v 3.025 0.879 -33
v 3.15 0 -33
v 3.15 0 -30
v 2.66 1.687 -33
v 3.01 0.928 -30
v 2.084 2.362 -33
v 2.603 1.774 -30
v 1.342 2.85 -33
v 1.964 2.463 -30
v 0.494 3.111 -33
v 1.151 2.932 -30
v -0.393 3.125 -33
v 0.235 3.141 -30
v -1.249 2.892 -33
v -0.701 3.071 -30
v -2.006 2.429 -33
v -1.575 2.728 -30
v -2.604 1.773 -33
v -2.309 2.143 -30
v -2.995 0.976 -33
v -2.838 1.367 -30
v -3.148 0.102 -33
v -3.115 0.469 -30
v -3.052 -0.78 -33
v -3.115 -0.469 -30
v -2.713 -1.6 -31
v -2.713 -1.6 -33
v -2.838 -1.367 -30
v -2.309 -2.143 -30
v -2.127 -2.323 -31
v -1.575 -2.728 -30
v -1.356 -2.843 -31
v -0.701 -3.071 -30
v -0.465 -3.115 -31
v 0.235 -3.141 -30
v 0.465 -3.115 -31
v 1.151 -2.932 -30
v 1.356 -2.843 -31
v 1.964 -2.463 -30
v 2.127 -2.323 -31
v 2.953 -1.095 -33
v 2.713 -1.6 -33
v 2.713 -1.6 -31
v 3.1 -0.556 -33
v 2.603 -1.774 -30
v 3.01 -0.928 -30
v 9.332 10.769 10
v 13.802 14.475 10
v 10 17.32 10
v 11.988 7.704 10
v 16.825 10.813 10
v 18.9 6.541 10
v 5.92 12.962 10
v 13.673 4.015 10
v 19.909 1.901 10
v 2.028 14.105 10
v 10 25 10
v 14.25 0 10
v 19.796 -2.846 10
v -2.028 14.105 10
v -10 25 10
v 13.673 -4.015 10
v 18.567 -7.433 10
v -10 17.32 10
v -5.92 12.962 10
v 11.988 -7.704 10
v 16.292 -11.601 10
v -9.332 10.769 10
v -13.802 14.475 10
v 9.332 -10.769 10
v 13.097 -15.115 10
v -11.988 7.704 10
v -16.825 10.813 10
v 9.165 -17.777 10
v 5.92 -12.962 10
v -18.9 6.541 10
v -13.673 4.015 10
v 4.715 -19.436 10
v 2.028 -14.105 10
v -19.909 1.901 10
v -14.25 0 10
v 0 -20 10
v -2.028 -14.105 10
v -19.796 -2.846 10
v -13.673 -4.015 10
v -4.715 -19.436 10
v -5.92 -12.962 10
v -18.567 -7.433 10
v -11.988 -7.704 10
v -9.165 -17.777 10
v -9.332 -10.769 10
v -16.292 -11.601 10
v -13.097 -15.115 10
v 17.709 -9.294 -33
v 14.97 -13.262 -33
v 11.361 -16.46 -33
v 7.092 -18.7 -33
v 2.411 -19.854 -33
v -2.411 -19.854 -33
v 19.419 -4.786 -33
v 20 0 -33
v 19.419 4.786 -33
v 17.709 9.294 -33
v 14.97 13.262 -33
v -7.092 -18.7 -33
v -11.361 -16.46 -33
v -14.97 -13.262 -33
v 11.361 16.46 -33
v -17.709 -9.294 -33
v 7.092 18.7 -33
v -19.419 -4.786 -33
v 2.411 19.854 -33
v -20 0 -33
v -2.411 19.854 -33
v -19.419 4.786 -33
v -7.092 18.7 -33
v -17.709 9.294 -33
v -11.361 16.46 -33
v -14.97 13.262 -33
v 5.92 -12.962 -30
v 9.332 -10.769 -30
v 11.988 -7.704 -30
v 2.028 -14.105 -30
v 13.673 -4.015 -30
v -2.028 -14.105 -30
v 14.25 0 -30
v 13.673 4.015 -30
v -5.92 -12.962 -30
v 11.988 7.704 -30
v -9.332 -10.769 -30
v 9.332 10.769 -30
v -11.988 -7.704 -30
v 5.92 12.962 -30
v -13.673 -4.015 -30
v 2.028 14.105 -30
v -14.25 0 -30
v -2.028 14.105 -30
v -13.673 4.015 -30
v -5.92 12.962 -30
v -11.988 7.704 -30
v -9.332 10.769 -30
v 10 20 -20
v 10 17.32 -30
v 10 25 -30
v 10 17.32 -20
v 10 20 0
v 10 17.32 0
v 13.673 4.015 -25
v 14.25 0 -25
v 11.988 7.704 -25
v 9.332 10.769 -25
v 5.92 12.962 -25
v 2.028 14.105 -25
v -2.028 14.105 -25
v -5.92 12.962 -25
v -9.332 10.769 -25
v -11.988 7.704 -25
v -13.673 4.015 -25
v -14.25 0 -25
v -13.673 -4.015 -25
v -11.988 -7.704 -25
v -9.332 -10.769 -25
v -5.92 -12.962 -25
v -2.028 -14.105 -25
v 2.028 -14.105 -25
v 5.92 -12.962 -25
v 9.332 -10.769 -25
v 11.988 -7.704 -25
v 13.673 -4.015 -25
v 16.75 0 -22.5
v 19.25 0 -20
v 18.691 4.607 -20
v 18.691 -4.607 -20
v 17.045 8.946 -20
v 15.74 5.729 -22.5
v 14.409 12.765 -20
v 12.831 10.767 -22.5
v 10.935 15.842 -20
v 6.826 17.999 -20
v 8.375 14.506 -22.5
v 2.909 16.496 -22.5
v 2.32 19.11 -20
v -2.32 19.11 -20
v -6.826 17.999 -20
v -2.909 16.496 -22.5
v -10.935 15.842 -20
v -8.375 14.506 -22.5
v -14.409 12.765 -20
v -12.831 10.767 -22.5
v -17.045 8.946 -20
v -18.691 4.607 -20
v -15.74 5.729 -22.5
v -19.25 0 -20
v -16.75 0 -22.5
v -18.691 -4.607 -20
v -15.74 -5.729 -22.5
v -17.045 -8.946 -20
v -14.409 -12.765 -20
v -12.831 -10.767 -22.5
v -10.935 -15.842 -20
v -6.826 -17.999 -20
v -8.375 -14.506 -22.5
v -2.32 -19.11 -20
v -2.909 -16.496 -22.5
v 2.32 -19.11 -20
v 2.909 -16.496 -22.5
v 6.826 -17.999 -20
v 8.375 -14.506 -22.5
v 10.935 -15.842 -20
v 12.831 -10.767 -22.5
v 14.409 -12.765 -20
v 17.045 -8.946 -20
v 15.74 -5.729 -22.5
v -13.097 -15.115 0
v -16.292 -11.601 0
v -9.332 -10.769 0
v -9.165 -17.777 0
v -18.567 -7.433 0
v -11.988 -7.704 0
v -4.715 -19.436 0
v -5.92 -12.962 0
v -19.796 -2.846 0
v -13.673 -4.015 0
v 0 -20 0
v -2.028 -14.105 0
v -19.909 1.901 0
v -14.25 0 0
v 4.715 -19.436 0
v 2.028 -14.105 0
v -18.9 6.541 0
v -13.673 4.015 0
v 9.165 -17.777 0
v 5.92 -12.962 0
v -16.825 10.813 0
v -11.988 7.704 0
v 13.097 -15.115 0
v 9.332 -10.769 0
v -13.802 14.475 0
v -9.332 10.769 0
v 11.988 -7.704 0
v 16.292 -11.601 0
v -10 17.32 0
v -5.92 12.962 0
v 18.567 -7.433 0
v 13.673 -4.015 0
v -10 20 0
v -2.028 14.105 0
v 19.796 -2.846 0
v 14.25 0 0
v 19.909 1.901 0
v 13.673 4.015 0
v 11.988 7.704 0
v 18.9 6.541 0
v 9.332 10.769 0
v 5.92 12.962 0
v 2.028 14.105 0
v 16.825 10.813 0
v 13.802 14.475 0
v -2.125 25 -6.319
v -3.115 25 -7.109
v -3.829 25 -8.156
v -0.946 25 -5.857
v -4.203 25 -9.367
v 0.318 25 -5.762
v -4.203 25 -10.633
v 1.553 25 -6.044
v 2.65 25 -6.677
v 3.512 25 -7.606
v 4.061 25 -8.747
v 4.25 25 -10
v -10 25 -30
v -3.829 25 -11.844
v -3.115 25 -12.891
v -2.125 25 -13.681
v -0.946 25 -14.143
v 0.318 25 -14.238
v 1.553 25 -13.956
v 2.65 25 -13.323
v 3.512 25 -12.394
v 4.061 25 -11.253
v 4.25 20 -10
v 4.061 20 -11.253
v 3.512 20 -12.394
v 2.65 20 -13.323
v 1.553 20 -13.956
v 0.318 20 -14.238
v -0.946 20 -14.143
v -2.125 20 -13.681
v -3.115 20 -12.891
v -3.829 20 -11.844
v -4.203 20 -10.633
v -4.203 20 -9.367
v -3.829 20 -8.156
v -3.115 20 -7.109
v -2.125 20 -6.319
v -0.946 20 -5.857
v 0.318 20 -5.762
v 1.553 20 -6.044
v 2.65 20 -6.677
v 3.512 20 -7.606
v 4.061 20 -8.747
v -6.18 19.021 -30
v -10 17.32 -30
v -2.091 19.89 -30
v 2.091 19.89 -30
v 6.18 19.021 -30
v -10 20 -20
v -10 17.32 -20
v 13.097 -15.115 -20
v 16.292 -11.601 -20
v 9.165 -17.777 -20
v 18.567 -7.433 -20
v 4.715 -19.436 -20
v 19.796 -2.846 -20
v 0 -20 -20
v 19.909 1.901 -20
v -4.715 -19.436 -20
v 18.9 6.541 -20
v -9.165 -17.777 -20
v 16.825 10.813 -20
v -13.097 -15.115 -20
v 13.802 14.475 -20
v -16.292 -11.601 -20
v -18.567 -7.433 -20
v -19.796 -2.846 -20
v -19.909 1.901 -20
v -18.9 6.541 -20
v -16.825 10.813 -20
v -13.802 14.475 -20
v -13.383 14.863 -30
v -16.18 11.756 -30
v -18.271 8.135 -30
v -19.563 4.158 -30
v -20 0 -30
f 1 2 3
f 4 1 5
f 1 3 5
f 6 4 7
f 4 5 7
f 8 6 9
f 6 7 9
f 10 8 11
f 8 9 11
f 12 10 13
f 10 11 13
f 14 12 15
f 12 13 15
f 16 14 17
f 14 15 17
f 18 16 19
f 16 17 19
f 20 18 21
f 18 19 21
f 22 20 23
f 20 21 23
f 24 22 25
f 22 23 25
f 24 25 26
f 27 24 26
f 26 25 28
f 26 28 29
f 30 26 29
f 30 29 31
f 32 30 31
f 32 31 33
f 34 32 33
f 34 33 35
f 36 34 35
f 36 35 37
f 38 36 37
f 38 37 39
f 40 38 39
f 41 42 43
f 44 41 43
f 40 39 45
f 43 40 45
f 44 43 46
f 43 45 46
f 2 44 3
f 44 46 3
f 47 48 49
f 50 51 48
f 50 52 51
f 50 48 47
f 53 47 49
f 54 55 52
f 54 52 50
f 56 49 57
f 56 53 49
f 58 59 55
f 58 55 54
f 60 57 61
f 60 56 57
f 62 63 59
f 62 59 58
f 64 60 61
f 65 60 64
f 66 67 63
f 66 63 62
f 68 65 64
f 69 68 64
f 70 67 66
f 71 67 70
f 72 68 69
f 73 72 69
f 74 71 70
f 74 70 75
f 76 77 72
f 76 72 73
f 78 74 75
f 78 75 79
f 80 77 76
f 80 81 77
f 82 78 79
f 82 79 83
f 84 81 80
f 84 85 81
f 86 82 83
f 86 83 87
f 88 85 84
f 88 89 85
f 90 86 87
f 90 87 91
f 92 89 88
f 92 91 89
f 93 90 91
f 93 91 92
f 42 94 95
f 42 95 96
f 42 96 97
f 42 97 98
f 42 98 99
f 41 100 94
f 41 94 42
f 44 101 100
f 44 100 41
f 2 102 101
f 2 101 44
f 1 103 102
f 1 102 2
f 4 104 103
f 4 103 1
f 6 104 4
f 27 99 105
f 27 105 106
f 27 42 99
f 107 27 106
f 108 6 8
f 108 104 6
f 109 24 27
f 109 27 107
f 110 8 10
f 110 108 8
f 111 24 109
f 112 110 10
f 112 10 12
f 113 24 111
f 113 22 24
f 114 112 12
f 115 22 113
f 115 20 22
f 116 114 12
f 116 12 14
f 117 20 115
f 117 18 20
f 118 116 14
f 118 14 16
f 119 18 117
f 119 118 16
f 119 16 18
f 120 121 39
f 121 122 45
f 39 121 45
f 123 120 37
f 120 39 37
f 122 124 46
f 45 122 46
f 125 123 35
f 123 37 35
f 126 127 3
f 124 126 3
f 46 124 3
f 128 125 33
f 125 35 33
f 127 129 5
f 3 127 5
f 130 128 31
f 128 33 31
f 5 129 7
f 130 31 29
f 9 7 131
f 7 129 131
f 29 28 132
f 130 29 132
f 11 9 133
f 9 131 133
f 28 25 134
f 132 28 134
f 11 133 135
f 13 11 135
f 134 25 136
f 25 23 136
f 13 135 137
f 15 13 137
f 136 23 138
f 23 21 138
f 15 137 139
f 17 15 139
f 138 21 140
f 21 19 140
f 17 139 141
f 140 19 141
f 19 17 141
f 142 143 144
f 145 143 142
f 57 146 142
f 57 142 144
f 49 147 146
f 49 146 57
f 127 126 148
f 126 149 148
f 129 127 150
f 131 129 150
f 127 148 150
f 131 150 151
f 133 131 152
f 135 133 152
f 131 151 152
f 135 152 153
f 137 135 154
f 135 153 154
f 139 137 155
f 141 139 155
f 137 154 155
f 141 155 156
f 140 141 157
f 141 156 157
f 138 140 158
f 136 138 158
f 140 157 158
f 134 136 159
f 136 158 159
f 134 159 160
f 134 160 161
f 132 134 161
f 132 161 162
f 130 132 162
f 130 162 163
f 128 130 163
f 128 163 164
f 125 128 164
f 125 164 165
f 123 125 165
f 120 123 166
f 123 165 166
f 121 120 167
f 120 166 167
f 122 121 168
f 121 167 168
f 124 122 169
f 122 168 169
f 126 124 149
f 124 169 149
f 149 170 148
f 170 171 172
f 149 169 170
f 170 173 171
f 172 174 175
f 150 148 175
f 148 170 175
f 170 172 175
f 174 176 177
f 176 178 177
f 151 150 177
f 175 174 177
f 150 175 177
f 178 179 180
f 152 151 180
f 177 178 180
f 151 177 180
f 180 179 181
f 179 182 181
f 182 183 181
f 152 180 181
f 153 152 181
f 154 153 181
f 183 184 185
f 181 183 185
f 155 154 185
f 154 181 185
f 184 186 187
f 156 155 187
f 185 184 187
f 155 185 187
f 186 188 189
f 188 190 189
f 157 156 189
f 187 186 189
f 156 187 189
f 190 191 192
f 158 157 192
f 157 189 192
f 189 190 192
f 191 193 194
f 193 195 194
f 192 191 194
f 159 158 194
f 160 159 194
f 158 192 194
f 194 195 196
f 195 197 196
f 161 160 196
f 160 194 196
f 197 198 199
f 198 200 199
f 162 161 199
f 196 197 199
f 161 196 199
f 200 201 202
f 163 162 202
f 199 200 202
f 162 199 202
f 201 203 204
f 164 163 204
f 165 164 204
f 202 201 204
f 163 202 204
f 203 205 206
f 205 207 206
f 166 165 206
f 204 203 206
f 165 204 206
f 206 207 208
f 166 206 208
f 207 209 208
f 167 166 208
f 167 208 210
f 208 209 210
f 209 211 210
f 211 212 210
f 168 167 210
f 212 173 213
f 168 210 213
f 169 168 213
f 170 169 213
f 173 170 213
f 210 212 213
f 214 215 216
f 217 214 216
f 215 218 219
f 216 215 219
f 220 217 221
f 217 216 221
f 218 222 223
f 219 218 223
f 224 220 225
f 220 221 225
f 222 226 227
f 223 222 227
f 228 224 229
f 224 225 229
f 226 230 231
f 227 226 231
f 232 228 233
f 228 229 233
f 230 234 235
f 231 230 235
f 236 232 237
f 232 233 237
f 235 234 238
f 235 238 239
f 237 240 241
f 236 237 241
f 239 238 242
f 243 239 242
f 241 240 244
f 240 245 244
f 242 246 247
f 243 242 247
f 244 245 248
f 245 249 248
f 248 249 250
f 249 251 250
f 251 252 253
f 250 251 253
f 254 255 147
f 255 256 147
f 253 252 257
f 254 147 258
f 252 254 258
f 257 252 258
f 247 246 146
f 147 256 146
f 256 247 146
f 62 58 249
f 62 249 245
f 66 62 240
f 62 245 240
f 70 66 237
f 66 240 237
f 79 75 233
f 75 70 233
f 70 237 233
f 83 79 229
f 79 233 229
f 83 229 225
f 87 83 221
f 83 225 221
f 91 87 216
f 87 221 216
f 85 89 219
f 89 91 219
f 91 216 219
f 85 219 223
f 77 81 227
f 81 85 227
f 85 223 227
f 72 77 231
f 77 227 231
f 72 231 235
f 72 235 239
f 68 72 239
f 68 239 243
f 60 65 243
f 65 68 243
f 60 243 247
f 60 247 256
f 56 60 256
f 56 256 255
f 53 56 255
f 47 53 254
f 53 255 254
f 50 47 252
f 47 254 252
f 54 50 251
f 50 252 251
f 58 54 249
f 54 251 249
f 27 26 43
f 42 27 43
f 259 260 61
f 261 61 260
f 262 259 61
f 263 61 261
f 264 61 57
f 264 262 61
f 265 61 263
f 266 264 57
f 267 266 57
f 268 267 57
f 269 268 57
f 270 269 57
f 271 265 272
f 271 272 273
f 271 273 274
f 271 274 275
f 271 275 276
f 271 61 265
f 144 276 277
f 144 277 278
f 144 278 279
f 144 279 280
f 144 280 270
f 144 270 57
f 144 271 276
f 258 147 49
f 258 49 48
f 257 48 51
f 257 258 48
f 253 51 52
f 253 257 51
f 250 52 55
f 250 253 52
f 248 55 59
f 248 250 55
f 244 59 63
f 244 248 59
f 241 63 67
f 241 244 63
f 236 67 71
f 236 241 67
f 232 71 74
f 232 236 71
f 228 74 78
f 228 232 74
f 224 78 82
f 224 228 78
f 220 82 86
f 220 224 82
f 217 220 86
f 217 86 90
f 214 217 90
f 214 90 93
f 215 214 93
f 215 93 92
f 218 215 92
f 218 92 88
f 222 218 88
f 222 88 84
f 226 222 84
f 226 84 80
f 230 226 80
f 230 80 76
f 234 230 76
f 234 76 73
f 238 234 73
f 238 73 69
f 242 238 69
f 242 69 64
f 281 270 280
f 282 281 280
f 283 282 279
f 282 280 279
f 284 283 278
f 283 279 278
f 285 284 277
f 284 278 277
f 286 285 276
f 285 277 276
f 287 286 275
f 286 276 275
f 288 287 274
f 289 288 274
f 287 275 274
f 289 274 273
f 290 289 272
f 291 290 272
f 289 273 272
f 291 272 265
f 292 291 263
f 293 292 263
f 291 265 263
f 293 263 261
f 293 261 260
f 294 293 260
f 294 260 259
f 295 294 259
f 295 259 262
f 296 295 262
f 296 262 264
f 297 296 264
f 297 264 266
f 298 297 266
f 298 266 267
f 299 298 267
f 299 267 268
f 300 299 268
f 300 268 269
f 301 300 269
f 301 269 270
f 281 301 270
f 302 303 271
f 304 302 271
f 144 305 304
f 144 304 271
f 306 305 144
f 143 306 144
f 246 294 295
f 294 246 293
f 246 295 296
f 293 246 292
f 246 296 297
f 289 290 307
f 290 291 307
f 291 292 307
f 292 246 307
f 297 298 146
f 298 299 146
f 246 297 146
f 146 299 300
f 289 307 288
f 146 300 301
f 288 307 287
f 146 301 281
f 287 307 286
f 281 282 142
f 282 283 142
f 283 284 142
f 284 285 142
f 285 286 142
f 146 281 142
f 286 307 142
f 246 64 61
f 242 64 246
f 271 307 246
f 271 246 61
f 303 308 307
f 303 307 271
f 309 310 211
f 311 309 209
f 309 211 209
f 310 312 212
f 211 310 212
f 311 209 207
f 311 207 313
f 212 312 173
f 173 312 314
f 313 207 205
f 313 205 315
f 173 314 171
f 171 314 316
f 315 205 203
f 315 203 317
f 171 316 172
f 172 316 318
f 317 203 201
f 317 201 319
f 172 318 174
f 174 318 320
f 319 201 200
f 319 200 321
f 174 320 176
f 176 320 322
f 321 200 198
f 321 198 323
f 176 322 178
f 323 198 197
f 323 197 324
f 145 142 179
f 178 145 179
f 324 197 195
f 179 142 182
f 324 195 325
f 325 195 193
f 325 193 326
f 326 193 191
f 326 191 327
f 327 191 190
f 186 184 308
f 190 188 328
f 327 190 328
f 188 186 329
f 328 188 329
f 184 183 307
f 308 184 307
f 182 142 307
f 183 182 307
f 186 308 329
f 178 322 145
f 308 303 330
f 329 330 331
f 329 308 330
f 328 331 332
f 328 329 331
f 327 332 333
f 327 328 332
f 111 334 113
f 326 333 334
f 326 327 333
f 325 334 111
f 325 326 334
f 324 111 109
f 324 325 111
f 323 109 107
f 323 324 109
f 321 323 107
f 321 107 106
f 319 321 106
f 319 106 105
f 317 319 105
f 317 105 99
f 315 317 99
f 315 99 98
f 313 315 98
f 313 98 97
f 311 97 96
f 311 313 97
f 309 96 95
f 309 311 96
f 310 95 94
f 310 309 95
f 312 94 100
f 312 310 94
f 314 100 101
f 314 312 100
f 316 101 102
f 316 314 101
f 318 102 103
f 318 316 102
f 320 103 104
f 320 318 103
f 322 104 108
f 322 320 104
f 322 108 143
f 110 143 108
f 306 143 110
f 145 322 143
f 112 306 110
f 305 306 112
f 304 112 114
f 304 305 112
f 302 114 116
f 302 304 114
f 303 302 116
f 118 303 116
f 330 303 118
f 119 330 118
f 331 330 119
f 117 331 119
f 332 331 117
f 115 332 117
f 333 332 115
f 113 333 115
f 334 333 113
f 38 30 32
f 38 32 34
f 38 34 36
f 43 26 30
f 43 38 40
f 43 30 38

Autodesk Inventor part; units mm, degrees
ref_plane "YZ Plane" through (0, 0, 0) normal (1, 0, 0) x (0, 1, 0)
ref_plane "XZ Plane" through (0, 0, 0) normal (0, 1, 0) x (-1, 0, 0)
ref_plane "XY Plane" through (0, 0, 0) normal (0, 0, 1) x (1, 0, 0)
sketch "Sketch1" plane through (0, 0, 0) normal (0, 0, 1) x (1, 0, 0)
  circle A0 centre (0, 0) radius 14.25
  circle A1 centre (0, 0) radius 20
  line L0 (0, 20) -> (10, 20)
  line L1 (10, 20) -> (10, 17.3205)
  line L2 (0, 20) -> (0, 20)
  line L3 (0, 20) -> (-10, 20)
  line L4 (-10, 20) -> (-10, 17.3205)
  point P0 (-20, 0)
  point P1 (20, 0)
  dimension "d0" = 28.5
  dimension "d1" = 40
  dimension "d25" = 10
  dimension "d31" = 10
  dimension "d32" = 0
extrude "Extrusion1" add sketch "Sketch1" along normal blind 10
ref_plane "Work Plane1" through (0, 0, -10) normal (0, 0, 1) x (1, 0, 0)
mirror "Mirror1" about plane through (0, 0, -10) normal (0, 0, 1) of "Extrusion1"
sketch "Sketch2" plane through (0, 0, -30) normal (0, 0, -1) x (-1, 0, 0)
  circle A0 centre (0, 0) radius 14.25 projected
  circle A1 centre (0, 0) radius 20
  dimension "d11" = 40
extrude "Extrusion2" add sketch "Sketch2" along normal blind 3 contours A0 | A1
sketch "Sketch3" plane through (0, 0, -30) normal (0, 0, 1) x (1, 0, 0)
  circle A0 centre (0, 0) radius 3.15
  dimension "d14" = 6.3
extrude "Extrusion3" cut sketch "Sketch3" against normal blind 1
sketch "Sketch4" plane through (0, 0, -31) normal (0, 0, 1) x (1, 0, 0)
  circle A0 centre (0, 0) radius 3.15
  line L0 (0, 0) -> (0, -1.6)
  line L1 (0, -1.6) -> (-2.7134, -1.6)
  line L2 (0, -1.6) -> (2.7134, -1.6)
  dimension "d17" = 6.3
  dimension "d18" = 1.6
extrude "Extrusion4" cut sketch "Sketch4" against normal through all contours A0 L2 L1 picked at (-0.0447, 1.5505)
sketch "Sketch6" plane through (-7.5, 20, -22) normal (0, 1, 0) x (1, 0, 0)
  line L0 (17.5, 8) -> (17.5, 8) projected
  line L1 (17.5, -22) -> (17.5, -32) projected
  line L2 (-2.5, 8) -> (17.5, 8)
  line L3 (17.5, 8) -> (17.5, -32)
  line L4 (17.5, -32) -> (-2.5, -32)
  line L5 (-2.5, -32) -> (-2.5, 8)
  point P0 (7.5, -22)
extrude "Extrusion6" add sketch "Sketch6" along normal blind 5
sketch "Sketch7" plane through (-7.5, 25, -22) normal (0, 1, 0) x (1, 0, 0)
  line L0 (21.75, -32) -> (-6.75, -32) projected
  line L1 (7.5, -32) -> (7.5, 8)
  line L2 (10.65, 8) -> (4.35, 8) projected
  circle A0 centre (7.5, -12) radius 4.25
  point P0 (7.5, -22)
  dimension "d28" = 8.5
extrude "Extrusion7" cut sketch "Sketch7" against normal up to next
chamfer "Chamfer1" distance 5 angle 45 1 edges at (-14.25, 0, -20)
equation "\"d4\" = d25"
equation "\"BendRadius\" = Thickness"
equation "\"BendReliefWidth\" = Thickness"
equation "\"BendReliefDepth\" = 0.5 * Thickness"
equation "\"CornerReliefSize\" = 4 * Thickness"
equation "\"MinimumRemnant\" = 2 * Thickness"
equation "\"TransitionRadius\" = BendRadius"
equation "\"JacobiRadiusSize\" = BendRadius"
equation "\"GapSize\" = Thickness"
equation "\"Thickness\" = 0.5"
properties part number "baseRotor1"
